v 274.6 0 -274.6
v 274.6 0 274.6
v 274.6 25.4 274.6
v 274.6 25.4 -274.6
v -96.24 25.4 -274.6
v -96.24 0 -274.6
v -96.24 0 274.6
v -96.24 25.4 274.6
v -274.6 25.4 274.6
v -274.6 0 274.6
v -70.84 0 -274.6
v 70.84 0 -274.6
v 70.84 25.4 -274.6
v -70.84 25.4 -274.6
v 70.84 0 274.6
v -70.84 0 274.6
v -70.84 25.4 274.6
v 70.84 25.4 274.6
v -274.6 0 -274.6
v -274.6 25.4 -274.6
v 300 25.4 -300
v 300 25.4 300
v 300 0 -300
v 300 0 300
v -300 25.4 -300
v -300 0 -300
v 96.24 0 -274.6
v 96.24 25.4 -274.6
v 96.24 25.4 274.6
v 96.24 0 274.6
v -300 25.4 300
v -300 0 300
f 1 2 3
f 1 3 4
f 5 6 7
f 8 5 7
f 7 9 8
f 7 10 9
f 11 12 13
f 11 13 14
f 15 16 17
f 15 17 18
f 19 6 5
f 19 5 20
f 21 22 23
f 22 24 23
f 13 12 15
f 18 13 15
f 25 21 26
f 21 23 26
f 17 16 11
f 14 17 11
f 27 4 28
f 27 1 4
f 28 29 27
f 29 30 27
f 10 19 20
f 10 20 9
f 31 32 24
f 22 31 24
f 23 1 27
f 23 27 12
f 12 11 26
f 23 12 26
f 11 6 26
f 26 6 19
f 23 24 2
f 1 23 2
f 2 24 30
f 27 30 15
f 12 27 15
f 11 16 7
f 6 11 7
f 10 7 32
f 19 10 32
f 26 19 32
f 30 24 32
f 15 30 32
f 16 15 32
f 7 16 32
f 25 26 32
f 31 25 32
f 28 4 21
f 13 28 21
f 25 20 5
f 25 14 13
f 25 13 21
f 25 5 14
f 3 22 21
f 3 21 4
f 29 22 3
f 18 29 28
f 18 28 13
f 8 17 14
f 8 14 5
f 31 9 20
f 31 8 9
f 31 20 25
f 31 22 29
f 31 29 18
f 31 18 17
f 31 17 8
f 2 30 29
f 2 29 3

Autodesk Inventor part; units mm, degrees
ref_plane "YZ Plane" through (0, 0, 0) normal (1, 0, 0) x (0, 1, 0)
ref_plane "XZ Plane" through (0, 0, 0) normal (0, 1, 0) x (-1, 0, 0)
ref_plane "XY Plane" through (0, 0, 0) normal (0, 0, 1) x (1, 0, 0)
sketch "Sketch1" plane through (0, 0, 0) normal (0, 1, 0) x (-1, 0, 0)
  line L0 (300, 300) -> (-300, 300)
  line L1 (-300, 300) -> (-300, -300)
  line L2 (-300, -300) -> (300, -300)
  line L3 (300, -300) -> (300, 300)
  line L4 (300, 300) -> (-300, -300) construction
  line L5 (-300, 300) -> (300, -300) construction
  line L6 (274.6, 274.6) -> (-274.6, 274.6)
  line L7 (-274.6, 274.6) -> (-274.6, -274.6)
  line L8 (-274.6, -274.6) -> (274.6, -274.6)
  line L9 (274.6, -274.6) -> (274.6, 274.6)
  line L10 (-70.84, -274.6) -> (-70.84, 274.6)
  line L11 (-96.24, 274.6) -> (-96.24, -274.6)
  line L12 (96.24, -274.6) -> (96.24, 274.6)
  line L13 (70.84, 274.6) -> (70.84, -274.6)
  line L14 (0, 0) -> (0, -274.6) construction
  dimension "d0" = 600
  dimension "d1" = 600
  dimension "d2" = 25.4
  dimension "d3" = 25.4
  dimension "d4" = 396.24
extrude "Extrusion1" add sketch "Sketch1" along normal blind 25.4 contours L3 L2 L1 L0 | L12 L8 L13 L6 | L10 L8 L11 L6
properties part number "MockChassis(delete asap)"
